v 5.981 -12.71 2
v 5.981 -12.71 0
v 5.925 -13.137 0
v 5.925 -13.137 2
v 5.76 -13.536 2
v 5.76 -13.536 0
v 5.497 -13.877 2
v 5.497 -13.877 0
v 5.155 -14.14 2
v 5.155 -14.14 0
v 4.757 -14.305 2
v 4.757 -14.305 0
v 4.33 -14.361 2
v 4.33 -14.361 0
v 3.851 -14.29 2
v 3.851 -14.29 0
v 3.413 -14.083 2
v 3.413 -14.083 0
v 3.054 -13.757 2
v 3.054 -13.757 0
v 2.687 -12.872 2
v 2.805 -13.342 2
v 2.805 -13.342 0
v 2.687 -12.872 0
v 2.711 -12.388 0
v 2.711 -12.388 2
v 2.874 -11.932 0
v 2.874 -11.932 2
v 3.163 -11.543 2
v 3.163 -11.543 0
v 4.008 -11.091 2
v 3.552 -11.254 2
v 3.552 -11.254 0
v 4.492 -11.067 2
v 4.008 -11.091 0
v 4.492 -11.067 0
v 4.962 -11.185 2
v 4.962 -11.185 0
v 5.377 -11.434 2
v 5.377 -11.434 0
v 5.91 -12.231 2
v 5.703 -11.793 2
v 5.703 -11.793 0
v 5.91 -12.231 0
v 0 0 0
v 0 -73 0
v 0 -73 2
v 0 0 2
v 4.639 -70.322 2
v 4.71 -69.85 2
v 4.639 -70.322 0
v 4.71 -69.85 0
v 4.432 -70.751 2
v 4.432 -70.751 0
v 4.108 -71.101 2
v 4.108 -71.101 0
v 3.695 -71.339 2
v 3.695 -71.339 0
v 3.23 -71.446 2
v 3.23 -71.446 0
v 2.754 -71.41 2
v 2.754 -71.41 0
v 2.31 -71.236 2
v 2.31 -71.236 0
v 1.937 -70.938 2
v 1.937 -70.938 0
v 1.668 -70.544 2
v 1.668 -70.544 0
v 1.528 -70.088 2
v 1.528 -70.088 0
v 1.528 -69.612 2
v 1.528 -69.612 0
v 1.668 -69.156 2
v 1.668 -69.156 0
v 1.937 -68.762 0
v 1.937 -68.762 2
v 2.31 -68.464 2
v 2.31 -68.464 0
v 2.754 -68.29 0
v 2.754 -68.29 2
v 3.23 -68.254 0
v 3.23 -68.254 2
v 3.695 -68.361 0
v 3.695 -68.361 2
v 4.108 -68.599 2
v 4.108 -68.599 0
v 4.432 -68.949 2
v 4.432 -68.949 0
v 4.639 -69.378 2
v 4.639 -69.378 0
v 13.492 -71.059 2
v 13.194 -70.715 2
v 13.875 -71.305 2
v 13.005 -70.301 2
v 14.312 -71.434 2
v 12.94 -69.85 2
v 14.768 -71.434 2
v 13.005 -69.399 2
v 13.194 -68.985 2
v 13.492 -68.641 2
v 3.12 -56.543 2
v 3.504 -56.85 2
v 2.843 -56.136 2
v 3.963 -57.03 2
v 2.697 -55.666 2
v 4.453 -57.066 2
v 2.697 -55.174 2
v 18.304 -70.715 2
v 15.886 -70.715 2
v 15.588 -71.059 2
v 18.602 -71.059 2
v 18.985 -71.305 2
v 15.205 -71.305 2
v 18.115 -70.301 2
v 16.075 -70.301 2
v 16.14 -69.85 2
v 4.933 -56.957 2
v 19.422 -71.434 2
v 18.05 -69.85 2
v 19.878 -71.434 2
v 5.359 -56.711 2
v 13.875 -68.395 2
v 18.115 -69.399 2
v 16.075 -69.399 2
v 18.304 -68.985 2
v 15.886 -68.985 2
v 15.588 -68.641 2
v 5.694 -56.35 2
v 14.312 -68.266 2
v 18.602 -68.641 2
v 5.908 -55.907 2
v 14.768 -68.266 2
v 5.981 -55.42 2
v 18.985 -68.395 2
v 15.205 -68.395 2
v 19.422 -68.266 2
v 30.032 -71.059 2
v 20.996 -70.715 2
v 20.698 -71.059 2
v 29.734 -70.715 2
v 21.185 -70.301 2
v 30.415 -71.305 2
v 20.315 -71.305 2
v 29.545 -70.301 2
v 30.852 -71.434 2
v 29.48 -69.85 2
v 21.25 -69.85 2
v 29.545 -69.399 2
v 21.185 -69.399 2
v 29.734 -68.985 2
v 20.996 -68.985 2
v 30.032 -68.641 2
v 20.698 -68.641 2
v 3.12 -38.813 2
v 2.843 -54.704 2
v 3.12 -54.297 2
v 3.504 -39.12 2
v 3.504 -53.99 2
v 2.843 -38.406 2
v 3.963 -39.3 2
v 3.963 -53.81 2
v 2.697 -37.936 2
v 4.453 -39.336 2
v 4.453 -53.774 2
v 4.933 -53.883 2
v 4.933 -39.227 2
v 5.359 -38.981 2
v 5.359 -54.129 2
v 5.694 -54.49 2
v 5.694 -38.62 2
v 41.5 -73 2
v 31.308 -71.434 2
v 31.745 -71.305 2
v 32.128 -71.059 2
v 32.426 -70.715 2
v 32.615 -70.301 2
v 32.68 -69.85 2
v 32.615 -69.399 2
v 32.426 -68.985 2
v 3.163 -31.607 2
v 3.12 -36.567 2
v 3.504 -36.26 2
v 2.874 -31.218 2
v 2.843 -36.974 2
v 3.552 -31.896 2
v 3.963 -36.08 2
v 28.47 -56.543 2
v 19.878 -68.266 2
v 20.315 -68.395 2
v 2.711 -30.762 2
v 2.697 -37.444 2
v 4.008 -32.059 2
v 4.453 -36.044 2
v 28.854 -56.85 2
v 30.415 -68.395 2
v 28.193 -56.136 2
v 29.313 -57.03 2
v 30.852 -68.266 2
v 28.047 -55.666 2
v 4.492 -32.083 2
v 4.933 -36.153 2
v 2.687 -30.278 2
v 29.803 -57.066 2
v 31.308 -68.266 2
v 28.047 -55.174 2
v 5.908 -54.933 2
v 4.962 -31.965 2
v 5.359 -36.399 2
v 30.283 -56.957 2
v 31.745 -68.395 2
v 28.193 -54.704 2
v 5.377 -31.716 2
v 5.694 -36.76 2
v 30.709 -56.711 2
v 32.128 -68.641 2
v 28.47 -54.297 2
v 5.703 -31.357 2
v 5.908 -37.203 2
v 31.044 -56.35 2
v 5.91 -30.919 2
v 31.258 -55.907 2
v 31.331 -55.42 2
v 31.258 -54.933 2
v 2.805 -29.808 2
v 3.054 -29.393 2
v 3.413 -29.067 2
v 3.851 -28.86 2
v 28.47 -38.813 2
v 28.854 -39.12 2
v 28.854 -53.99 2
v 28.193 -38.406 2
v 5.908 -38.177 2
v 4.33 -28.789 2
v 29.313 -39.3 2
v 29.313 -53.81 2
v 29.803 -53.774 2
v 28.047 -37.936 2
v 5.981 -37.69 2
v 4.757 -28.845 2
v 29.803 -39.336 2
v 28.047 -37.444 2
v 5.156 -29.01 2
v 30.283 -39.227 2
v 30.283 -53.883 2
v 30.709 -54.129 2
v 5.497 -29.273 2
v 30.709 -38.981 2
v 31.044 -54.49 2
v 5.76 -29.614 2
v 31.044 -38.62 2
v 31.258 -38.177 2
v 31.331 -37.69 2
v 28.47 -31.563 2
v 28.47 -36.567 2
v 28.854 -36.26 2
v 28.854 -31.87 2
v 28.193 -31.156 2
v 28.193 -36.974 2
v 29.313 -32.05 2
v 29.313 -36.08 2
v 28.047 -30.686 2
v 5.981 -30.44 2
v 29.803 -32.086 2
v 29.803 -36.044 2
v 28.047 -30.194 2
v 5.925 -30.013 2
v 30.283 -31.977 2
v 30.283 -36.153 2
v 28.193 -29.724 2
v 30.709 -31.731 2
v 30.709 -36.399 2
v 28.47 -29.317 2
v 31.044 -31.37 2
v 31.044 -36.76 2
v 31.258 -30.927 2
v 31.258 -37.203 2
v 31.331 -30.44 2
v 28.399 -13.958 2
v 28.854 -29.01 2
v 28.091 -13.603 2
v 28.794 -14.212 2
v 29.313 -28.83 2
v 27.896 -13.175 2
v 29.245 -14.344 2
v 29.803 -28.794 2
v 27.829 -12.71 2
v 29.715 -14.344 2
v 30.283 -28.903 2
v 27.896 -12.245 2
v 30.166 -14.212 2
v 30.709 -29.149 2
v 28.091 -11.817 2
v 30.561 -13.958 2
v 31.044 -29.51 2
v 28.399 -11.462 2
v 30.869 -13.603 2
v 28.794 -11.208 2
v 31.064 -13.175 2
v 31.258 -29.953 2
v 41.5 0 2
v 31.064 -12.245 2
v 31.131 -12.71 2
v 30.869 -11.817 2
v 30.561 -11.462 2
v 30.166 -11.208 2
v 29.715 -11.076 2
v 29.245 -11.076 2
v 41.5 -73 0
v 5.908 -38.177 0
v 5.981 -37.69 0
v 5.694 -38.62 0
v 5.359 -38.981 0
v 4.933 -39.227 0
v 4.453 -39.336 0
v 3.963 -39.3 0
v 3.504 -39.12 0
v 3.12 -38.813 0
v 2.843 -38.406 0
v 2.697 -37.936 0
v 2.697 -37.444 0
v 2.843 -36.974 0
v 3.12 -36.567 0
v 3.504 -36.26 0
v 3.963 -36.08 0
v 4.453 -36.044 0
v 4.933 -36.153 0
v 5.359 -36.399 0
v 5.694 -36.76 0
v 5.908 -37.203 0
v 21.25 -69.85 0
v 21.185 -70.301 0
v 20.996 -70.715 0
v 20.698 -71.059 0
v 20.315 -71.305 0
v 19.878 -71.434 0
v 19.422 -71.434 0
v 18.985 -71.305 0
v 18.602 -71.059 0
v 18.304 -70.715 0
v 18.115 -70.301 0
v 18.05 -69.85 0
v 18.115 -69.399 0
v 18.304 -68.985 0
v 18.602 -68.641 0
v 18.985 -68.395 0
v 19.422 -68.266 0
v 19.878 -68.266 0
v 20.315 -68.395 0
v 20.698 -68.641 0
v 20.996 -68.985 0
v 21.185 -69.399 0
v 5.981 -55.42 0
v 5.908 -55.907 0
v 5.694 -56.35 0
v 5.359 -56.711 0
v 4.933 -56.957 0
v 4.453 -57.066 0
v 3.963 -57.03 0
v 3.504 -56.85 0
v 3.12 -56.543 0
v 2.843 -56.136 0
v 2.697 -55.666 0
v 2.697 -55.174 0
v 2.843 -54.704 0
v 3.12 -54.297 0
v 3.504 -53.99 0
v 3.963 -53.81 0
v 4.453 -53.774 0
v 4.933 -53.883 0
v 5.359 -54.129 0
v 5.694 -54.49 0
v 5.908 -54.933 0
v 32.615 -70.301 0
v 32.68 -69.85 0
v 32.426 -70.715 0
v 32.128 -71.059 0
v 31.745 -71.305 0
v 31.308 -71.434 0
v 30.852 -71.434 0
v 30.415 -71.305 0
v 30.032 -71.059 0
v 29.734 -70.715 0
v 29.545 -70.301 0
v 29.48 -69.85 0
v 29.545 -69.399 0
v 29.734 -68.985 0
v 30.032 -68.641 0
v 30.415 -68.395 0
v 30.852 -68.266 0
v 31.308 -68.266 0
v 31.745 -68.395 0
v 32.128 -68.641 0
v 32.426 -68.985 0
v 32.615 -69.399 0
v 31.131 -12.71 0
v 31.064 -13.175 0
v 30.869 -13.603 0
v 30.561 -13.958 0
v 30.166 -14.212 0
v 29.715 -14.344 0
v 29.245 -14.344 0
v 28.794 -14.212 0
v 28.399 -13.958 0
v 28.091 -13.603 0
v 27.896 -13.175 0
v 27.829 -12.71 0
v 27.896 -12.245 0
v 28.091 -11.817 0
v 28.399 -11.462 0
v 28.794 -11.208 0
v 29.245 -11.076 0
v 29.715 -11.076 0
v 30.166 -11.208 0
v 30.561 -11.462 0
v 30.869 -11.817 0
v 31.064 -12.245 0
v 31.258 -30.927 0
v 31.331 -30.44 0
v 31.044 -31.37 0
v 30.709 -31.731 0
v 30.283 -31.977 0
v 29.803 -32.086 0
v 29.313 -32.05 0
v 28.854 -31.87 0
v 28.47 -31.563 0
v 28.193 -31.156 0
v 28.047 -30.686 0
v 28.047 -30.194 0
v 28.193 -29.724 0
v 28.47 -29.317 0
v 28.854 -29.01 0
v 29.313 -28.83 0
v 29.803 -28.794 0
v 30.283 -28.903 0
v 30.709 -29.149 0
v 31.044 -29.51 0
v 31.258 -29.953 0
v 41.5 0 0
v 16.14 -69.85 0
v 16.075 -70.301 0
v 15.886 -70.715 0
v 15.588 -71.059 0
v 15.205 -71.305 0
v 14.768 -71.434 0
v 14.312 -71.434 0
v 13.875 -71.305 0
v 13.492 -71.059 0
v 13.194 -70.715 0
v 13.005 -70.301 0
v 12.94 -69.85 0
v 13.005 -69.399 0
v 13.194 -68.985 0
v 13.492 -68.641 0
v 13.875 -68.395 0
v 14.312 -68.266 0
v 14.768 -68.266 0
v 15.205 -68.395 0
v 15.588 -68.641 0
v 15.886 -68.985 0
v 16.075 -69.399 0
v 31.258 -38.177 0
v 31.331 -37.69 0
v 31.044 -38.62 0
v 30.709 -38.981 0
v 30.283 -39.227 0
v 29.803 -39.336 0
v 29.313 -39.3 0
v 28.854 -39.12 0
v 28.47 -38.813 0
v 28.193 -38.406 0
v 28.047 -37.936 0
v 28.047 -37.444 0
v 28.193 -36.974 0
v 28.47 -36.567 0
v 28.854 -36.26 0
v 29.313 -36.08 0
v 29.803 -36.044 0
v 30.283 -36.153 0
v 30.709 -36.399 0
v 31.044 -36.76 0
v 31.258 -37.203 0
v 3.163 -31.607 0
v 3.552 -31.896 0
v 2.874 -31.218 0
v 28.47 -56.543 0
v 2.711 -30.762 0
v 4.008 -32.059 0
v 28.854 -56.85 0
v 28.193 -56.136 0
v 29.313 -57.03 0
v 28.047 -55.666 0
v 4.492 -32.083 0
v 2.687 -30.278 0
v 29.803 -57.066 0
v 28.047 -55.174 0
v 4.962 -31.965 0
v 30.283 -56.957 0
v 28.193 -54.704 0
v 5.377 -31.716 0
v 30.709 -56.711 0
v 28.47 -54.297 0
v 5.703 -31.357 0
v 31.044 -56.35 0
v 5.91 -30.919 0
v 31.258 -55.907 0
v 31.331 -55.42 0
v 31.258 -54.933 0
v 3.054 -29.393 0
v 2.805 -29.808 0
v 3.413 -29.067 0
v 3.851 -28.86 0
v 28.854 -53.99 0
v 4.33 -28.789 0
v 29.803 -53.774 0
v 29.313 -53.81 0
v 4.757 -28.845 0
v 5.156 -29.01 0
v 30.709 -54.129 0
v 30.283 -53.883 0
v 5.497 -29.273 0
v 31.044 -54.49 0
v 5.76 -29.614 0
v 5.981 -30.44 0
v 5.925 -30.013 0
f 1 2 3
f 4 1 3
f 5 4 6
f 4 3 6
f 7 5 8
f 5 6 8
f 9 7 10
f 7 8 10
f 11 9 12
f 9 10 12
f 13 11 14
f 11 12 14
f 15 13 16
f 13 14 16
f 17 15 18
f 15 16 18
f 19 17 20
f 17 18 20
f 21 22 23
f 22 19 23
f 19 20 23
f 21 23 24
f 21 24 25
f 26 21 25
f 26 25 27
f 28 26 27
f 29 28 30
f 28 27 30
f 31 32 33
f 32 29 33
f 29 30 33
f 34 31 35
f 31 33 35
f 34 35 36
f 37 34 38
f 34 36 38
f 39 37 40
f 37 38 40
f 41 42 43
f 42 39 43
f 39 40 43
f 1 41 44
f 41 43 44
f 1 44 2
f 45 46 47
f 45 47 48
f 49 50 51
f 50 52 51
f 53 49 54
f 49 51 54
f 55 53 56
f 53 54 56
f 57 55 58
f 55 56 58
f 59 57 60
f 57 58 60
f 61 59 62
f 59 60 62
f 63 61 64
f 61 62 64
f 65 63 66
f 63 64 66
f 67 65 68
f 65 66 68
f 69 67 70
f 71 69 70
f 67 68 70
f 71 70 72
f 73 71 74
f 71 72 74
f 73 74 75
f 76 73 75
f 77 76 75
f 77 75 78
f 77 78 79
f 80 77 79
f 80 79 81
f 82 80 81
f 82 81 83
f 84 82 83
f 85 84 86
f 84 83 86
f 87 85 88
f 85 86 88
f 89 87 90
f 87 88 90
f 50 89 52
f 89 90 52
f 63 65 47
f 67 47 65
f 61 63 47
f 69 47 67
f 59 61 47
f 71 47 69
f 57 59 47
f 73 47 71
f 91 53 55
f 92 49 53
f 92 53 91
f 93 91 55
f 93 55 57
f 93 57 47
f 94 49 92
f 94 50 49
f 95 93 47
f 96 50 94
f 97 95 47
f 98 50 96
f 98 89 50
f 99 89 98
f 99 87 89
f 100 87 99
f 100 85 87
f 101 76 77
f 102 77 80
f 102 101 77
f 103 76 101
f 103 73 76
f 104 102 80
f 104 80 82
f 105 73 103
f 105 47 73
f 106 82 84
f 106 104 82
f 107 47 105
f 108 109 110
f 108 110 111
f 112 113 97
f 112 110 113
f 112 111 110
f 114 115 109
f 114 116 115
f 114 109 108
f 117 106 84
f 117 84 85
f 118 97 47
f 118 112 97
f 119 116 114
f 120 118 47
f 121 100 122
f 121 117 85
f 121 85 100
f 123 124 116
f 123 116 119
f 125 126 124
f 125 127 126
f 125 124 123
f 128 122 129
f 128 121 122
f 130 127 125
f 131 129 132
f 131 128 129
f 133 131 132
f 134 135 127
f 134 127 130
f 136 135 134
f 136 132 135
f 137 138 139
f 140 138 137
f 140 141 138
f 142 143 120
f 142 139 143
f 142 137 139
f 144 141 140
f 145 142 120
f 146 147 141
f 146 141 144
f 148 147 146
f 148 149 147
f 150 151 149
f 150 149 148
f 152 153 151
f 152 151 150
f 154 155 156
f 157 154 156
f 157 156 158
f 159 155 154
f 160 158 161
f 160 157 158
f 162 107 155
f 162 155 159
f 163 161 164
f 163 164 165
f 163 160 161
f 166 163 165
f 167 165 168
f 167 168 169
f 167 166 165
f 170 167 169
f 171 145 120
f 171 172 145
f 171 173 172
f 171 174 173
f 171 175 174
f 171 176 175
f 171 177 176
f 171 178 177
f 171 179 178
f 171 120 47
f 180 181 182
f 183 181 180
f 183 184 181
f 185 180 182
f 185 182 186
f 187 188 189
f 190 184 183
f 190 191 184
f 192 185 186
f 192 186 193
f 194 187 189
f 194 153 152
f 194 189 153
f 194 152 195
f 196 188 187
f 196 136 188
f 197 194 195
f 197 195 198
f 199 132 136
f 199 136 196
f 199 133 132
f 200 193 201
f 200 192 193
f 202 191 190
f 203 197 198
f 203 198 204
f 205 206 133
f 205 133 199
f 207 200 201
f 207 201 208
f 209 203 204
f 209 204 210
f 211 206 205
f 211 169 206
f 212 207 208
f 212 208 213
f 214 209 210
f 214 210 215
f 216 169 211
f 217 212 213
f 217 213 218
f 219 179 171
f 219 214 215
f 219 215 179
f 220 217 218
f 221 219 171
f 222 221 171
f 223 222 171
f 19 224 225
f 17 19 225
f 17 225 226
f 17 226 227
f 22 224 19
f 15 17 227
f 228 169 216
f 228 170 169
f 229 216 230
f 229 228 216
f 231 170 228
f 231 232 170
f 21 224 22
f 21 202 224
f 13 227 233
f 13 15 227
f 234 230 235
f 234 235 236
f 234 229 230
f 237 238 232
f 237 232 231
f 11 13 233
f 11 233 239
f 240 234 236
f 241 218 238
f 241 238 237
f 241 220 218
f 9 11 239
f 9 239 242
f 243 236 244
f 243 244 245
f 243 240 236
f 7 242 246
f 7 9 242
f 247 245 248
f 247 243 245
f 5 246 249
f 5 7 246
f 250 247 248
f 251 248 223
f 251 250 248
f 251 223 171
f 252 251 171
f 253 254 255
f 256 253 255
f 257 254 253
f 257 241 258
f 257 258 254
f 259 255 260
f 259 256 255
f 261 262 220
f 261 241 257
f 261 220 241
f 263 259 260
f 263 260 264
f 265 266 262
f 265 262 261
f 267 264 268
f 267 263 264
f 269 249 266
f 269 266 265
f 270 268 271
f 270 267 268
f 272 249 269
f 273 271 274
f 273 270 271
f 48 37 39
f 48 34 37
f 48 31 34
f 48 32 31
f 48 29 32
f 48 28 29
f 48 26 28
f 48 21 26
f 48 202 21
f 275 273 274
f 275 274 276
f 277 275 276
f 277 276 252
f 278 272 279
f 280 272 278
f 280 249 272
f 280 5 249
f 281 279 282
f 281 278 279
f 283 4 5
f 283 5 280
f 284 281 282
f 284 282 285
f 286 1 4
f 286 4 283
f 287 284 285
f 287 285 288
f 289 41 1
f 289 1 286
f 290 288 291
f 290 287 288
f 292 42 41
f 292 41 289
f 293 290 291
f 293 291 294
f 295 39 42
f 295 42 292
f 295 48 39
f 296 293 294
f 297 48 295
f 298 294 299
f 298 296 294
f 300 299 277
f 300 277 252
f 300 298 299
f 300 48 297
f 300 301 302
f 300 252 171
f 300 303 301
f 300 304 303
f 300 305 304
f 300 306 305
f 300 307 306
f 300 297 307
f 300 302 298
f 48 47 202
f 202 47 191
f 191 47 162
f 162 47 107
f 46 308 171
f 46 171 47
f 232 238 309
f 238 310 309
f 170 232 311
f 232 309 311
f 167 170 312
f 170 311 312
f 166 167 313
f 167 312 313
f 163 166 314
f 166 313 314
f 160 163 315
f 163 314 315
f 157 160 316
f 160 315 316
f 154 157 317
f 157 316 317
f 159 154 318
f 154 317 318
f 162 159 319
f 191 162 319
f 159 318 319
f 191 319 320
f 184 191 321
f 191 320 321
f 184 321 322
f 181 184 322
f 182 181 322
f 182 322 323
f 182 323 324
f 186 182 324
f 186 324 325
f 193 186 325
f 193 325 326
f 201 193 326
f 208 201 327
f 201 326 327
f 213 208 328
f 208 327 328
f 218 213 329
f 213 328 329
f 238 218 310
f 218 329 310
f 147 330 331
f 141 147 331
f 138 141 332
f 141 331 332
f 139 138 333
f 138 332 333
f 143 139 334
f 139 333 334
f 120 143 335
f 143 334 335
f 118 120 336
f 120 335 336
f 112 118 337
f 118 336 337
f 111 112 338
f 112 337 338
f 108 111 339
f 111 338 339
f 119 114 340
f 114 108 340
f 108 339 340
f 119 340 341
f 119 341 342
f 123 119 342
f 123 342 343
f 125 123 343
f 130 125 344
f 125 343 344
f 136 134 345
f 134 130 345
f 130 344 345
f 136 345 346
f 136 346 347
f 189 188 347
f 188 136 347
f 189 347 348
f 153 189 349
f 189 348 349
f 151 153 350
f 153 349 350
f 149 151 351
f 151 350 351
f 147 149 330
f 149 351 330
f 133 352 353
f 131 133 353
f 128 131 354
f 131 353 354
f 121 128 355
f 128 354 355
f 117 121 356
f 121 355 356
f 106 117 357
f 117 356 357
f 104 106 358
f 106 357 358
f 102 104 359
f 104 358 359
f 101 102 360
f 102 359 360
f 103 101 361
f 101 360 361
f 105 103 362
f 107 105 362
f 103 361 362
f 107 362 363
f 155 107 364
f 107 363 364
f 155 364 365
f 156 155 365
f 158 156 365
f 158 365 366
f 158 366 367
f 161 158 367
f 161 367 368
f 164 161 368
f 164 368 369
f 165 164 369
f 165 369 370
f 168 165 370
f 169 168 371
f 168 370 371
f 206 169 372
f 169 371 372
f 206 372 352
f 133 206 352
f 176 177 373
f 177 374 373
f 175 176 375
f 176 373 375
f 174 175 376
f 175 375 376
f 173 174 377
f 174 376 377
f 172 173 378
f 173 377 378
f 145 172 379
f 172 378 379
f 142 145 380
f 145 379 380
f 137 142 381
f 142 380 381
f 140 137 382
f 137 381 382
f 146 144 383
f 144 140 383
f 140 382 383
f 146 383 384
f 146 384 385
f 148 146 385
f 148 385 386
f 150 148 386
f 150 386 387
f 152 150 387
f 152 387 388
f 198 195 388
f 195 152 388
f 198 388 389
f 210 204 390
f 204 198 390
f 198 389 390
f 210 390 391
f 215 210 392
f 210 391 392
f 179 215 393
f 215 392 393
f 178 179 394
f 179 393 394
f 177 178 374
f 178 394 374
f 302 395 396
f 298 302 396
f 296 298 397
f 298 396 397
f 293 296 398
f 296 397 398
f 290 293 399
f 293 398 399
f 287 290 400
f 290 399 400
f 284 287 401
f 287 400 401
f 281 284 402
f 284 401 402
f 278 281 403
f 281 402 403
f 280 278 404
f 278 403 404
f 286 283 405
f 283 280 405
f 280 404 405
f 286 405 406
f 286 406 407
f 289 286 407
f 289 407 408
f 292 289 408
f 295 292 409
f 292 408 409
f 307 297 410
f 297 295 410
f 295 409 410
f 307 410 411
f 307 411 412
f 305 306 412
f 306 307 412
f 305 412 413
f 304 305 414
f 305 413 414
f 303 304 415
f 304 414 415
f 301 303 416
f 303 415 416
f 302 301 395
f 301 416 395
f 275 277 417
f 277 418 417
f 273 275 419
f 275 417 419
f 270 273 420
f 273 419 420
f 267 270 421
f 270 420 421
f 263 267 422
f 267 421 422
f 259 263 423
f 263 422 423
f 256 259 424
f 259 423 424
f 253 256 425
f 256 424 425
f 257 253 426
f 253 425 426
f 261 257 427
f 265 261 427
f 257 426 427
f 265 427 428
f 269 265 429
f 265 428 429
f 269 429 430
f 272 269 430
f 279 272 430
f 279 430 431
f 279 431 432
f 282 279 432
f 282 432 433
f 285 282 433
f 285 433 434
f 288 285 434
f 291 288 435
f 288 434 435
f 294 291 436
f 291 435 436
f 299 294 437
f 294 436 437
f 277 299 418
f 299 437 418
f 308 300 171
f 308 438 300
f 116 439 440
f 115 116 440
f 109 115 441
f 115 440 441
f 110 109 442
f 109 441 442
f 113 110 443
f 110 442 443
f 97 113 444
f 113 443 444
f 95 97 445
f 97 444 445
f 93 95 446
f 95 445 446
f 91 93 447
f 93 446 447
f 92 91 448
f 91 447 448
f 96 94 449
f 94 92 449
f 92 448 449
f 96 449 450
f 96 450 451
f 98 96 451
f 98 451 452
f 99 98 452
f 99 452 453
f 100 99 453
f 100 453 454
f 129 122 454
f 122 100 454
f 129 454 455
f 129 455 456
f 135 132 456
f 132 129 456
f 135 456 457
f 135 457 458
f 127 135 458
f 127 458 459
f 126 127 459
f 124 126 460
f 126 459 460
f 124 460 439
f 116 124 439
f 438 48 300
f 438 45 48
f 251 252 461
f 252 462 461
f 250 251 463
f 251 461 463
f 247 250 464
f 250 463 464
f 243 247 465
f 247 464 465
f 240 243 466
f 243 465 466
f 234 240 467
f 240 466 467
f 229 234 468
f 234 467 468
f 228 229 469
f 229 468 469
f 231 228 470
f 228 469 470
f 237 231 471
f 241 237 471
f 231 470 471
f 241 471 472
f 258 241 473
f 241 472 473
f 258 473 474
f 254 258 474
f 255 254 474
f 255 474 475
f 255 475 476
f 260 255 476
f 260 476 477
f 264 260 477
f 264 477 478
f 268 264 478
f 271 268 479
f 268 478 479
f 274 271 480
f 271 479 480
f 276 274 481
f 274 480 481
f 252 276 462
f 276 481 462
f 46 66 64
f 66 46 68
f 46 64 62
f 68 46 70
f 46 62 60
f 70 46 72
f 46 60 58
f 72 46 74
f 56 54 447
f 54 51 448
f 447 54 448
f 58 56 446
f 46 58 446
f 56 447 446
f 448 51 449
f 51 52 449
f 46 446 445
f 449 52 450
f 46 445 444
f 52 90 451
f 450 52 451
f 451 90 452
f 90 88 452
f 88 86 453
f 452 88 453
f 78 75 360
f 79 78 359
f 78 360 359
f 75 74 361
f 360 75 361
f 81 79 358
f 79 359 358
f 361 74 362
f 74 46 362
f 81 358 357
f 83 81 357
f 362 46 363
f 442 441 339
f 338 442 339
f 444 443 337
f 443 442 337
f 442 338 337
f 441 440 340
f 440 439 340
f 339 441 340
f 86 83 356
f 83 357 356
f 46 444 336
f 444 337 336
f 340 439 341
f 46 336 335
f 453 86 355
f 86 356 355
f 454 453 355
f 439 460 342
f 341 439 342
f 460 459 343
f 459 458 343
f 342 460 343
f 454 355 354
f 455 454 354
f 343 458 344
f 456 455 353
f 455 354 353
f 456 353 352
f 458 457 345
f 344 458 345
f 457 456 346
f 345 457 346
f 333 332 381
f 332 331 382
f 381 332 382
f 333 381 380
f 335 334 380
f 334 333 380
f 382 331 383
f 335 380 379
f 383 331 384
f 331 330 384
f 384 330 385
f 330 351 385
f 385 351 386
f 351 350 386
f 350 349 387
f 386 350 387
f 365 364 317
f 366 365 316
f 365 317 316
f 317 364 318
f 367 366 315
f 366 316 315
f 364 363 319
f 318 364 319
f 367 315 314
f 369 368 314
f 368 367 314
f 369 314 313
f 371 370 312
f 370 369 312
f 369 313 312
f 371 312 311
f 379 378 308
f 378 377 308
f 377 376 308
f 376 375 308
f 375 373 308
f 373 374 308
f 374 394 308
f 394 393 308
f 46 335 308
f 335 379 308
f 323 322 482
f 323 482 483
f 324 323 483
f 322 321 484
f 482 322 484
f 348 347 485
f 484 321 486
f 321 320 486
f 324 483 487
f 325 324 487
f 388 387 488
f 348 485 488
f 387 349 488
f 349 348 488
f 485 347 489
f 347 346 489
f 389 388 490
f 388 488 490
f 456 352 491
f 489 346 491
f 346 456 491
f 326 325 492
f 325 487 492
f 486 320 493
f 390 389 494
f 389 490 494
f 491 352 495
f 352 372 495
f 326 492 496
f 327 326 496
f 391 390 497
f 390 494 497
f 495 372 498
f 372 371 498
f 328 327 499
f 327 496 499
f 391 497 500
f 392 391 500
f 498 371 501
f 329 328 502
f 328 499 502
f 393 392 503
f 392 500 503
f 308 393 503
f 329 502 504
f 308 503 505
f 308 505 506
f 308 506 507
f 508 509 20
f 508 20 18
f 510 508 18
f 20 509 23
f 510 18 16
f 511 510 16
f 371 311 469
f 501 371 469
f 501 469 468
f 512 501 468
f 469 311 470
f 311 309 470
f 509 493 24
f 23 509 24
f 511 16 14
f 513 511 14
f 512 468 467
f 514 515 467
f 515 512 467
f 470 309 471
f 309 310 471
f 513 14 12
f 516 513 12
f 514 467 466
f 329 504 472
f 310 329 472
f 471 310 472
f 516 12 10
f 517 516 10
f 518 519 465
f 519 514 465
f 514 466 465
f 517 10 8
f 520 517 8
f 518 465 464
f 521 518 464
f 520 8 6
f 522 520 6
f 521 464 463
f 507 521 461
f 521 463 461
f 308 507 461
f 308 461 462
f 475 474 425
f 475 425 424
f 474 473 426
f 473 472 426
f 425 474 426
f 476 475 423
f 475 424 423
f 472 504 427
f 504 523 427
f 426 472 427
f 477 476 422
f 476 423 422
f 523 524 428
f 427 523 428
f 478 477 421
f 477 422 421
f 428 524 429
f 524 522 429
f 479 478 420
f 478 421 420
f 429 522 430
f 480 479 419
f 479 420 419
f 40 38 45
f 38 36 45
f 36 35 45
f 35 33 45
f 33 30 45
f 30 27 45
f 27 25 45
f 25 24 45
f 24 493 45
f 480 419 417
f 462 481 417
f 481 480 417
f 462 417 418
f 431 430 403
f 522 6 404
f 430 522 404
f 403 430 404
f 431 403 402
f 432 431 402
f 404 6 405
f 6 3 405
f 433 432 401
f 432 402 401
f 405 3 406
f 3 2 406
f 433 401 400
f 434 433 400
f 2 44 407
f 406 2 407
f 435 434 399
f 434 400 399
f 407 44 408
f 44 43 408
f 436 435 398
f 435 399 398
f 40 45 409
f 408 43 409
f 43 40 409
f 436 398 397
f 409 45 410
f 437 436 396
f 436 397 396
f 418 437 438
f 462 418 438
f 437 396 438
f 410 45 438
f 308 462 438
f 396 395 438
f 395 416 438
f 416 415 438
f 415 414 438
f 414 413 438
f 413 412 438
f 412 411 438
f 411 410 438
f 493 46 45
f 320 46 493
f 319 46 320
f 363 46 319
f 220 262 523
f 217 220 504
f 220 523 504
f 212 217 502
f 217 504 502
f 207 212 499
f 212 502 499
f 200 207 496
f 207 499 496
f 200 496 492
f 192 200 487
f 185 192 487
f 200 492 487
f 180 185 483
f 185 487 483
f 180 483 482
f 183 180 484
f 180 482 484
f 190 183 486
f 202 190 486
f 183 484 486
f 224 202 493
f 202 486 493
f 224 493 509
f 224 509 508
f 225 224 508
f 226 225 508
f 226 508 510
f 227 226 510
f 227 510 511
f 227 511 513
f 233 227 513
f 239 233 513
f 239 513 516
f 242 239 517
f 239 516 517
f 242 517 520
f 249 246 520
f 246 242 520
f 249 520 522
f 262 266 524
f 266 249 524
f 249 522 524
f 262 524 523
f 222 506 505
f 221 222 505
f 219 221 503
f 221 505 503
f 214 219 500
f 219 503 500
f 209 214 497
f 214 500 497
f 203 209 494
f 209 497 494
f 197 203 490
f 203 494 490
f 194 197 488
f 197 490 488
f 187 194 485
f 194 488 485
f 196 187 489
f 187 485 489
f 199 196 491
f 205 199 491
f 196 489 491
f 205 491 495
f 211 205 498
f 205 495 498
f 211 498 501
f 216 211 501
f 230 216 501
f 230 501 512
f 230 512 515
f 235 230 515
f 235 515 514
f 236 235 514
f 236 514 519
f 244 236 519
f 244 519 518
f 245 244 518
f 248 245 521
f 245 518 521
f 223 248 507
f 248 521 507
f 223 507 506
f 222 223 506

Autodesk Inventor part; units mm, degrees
ref_plane "YZ Plane" through (0, 0, 0) normal (1, 0, 0) x (0, 1, 0)
ref_plane "XZ Plane" through (0, 0, 0) normal (0, 1, 0) x (-1, 0, 0)
ref_plane "XY Plane" through (0, 0, 0) normal (0, 0, 1) x (1, 0, 0)
sketch "Sketch1" plane through (0, 0, 0) normal (0, 0, 1) x (1, 0, 0)
  line L0 (0, 0) -> (41.5, 0)
  line L1 (41.5, 0) -> (41.5, -73)
  line L2 (41.5, -73) -> (0, -73)
  line L3 (0, -73) -> (0, 0)
  line L4 (0, -73) -> (3.11, -73)
  line L5 (0, -73) -> (3.11, -73) construction
  line L6 (3.11, -73) -> (3.11, -69.85)
  line L7 (3.11, -73) -> (6.26, -73) construction
  line L8 (3.11, -69.85) -> (14.54, -69.85)
  line L9 (14.54, -69.85) -> (19.65, -69.85)
  line L10 (19.65, -69.85) -> (31.08, -69.85)
  circle A0 centre (3.11, -69.85) radius 1.6
  circle A1 centre (14.54, -69.85) radius 1.6
  circle A2 centre (19.65, -69.85) radius 1.6
  circle A3 centre (31.08, -69.85) radius 1.6
  line L11 (3.11, -69.85) -> (3.11, -55.42)
  line L12 (3.11, -69.85) -> (17.54, -69.85) construction
  line L13 (0, -73) -> (4.33, -73)
  line L14 (0, -73) -> (4.33, -73) construction
  line L15 (4.33, -73) -> (4.33, -53.49)
  line L16 (3.11, -55.42) -> (6.6479, -55.42)
  circle A4 centre (4.33, -55.42) radius 1.651
  line L17 (4.33, -55.42) -> (4.33, -37.69)
  line L18 (4.33, -55.42) -> (22.06, -55.42) construction
  line L19 (4.33, -55.42) -> (29.68, -55.42)
  line L20 (4.33, -55.42) -> (29.68, -55.42) construction
  circle A5 centre (4.33, -37.69) radius 1.651
  circle A6 centre (29.68, -55.42) radius 1.651
  line L21 (4.33, -37.69) -> (39.0376, -37.69)
  line L22 (29.68, -55.42) -> (29.68, -25.3245)
  circle A7 centre (29.68, -37.69) radius 1.651
  line L23 (4.33, -37.69) -> (4.33, -30.44)
  line L24 (4.33, -37.69) -> (11.58, -37.69) construction
  line L25 (4.33, -30.44) -> (4.33, -12.71)
  line L26 (4.33, -30.44) -> (29.68, -30.44)
  line L27 (4.33, -30.44) -> (29.68, -30.44) construction
  line L28 (4.33, -12.71) -> (29.68, -12.71)
  circle A8 centre (29.48, -12.71) radius 1.651
  circle A9 centre (4.33, -12.71) radius 1.651
  circle A10 centre (4.33, -30.44) radius 1.651
  circle A11 centre (29.68, -30.44) radius 1.651
  dimension "d0" = 41.5
  dimension "d1" = 73
  dimension "d2" = 3.11
  dimension "d3" = 0
  dimension "d4" = 3.15
  dimension "d5" = 90
  dimension "d6" = 11.43
  dimension "d7" = 90
  dimension "d9" = 5.11
  dimension "d10" = 11.43
  dimension "d11" = 180
  dimension "d12" = 3.2
  dimension "d13" = 3.2
  dimension "d14" = 3.2
  dimension "d15" = 3.2
  dimension "d18" = 14.43
  dimension "d19" = 90
  dimension "d20" = 4.33
  dimension "d21" = 0
  dimension "d22" = 3.302
  dimension "d23" = 17.73
  dimension "d24" = 90
  dimension "d25" = 25.35
  dimension "d26" = 0
  dimension "d27" = 3.302
  dimension "d28" = 3.302
  dimension "d29" = 3.302
  dimension "d30" = 7.25
  dimension "d31" = 90
  dimension "d32" = 17.73
  dimension "d33" = 180
  dimension "d34" = 25.35
  dimension "d35" = 0
  dimension "d36" = 25.35
  dimension "d37" = 3.302
  dimension "d38" = 3.302
  dimension "d39" = 3.302
  dimension "d40" = 3.302
extrude "Extrusion2" add sketch "Sketch1" along normal blind 2 contours L0 L1 L2 L15 A0 A4 L16 L19 A6 L22 A7 A11 L26 A10 L23 A5 L17 L11 L6 L3 | L6 A0 L15 L2 | L11 A4 L15 A0 | L15 L17 A5 L21 A7 L22 A6 L19 L16 A4 | L23 A10 L26 A11 L22 A7 L21 A5
properties part number "mountPCB"
